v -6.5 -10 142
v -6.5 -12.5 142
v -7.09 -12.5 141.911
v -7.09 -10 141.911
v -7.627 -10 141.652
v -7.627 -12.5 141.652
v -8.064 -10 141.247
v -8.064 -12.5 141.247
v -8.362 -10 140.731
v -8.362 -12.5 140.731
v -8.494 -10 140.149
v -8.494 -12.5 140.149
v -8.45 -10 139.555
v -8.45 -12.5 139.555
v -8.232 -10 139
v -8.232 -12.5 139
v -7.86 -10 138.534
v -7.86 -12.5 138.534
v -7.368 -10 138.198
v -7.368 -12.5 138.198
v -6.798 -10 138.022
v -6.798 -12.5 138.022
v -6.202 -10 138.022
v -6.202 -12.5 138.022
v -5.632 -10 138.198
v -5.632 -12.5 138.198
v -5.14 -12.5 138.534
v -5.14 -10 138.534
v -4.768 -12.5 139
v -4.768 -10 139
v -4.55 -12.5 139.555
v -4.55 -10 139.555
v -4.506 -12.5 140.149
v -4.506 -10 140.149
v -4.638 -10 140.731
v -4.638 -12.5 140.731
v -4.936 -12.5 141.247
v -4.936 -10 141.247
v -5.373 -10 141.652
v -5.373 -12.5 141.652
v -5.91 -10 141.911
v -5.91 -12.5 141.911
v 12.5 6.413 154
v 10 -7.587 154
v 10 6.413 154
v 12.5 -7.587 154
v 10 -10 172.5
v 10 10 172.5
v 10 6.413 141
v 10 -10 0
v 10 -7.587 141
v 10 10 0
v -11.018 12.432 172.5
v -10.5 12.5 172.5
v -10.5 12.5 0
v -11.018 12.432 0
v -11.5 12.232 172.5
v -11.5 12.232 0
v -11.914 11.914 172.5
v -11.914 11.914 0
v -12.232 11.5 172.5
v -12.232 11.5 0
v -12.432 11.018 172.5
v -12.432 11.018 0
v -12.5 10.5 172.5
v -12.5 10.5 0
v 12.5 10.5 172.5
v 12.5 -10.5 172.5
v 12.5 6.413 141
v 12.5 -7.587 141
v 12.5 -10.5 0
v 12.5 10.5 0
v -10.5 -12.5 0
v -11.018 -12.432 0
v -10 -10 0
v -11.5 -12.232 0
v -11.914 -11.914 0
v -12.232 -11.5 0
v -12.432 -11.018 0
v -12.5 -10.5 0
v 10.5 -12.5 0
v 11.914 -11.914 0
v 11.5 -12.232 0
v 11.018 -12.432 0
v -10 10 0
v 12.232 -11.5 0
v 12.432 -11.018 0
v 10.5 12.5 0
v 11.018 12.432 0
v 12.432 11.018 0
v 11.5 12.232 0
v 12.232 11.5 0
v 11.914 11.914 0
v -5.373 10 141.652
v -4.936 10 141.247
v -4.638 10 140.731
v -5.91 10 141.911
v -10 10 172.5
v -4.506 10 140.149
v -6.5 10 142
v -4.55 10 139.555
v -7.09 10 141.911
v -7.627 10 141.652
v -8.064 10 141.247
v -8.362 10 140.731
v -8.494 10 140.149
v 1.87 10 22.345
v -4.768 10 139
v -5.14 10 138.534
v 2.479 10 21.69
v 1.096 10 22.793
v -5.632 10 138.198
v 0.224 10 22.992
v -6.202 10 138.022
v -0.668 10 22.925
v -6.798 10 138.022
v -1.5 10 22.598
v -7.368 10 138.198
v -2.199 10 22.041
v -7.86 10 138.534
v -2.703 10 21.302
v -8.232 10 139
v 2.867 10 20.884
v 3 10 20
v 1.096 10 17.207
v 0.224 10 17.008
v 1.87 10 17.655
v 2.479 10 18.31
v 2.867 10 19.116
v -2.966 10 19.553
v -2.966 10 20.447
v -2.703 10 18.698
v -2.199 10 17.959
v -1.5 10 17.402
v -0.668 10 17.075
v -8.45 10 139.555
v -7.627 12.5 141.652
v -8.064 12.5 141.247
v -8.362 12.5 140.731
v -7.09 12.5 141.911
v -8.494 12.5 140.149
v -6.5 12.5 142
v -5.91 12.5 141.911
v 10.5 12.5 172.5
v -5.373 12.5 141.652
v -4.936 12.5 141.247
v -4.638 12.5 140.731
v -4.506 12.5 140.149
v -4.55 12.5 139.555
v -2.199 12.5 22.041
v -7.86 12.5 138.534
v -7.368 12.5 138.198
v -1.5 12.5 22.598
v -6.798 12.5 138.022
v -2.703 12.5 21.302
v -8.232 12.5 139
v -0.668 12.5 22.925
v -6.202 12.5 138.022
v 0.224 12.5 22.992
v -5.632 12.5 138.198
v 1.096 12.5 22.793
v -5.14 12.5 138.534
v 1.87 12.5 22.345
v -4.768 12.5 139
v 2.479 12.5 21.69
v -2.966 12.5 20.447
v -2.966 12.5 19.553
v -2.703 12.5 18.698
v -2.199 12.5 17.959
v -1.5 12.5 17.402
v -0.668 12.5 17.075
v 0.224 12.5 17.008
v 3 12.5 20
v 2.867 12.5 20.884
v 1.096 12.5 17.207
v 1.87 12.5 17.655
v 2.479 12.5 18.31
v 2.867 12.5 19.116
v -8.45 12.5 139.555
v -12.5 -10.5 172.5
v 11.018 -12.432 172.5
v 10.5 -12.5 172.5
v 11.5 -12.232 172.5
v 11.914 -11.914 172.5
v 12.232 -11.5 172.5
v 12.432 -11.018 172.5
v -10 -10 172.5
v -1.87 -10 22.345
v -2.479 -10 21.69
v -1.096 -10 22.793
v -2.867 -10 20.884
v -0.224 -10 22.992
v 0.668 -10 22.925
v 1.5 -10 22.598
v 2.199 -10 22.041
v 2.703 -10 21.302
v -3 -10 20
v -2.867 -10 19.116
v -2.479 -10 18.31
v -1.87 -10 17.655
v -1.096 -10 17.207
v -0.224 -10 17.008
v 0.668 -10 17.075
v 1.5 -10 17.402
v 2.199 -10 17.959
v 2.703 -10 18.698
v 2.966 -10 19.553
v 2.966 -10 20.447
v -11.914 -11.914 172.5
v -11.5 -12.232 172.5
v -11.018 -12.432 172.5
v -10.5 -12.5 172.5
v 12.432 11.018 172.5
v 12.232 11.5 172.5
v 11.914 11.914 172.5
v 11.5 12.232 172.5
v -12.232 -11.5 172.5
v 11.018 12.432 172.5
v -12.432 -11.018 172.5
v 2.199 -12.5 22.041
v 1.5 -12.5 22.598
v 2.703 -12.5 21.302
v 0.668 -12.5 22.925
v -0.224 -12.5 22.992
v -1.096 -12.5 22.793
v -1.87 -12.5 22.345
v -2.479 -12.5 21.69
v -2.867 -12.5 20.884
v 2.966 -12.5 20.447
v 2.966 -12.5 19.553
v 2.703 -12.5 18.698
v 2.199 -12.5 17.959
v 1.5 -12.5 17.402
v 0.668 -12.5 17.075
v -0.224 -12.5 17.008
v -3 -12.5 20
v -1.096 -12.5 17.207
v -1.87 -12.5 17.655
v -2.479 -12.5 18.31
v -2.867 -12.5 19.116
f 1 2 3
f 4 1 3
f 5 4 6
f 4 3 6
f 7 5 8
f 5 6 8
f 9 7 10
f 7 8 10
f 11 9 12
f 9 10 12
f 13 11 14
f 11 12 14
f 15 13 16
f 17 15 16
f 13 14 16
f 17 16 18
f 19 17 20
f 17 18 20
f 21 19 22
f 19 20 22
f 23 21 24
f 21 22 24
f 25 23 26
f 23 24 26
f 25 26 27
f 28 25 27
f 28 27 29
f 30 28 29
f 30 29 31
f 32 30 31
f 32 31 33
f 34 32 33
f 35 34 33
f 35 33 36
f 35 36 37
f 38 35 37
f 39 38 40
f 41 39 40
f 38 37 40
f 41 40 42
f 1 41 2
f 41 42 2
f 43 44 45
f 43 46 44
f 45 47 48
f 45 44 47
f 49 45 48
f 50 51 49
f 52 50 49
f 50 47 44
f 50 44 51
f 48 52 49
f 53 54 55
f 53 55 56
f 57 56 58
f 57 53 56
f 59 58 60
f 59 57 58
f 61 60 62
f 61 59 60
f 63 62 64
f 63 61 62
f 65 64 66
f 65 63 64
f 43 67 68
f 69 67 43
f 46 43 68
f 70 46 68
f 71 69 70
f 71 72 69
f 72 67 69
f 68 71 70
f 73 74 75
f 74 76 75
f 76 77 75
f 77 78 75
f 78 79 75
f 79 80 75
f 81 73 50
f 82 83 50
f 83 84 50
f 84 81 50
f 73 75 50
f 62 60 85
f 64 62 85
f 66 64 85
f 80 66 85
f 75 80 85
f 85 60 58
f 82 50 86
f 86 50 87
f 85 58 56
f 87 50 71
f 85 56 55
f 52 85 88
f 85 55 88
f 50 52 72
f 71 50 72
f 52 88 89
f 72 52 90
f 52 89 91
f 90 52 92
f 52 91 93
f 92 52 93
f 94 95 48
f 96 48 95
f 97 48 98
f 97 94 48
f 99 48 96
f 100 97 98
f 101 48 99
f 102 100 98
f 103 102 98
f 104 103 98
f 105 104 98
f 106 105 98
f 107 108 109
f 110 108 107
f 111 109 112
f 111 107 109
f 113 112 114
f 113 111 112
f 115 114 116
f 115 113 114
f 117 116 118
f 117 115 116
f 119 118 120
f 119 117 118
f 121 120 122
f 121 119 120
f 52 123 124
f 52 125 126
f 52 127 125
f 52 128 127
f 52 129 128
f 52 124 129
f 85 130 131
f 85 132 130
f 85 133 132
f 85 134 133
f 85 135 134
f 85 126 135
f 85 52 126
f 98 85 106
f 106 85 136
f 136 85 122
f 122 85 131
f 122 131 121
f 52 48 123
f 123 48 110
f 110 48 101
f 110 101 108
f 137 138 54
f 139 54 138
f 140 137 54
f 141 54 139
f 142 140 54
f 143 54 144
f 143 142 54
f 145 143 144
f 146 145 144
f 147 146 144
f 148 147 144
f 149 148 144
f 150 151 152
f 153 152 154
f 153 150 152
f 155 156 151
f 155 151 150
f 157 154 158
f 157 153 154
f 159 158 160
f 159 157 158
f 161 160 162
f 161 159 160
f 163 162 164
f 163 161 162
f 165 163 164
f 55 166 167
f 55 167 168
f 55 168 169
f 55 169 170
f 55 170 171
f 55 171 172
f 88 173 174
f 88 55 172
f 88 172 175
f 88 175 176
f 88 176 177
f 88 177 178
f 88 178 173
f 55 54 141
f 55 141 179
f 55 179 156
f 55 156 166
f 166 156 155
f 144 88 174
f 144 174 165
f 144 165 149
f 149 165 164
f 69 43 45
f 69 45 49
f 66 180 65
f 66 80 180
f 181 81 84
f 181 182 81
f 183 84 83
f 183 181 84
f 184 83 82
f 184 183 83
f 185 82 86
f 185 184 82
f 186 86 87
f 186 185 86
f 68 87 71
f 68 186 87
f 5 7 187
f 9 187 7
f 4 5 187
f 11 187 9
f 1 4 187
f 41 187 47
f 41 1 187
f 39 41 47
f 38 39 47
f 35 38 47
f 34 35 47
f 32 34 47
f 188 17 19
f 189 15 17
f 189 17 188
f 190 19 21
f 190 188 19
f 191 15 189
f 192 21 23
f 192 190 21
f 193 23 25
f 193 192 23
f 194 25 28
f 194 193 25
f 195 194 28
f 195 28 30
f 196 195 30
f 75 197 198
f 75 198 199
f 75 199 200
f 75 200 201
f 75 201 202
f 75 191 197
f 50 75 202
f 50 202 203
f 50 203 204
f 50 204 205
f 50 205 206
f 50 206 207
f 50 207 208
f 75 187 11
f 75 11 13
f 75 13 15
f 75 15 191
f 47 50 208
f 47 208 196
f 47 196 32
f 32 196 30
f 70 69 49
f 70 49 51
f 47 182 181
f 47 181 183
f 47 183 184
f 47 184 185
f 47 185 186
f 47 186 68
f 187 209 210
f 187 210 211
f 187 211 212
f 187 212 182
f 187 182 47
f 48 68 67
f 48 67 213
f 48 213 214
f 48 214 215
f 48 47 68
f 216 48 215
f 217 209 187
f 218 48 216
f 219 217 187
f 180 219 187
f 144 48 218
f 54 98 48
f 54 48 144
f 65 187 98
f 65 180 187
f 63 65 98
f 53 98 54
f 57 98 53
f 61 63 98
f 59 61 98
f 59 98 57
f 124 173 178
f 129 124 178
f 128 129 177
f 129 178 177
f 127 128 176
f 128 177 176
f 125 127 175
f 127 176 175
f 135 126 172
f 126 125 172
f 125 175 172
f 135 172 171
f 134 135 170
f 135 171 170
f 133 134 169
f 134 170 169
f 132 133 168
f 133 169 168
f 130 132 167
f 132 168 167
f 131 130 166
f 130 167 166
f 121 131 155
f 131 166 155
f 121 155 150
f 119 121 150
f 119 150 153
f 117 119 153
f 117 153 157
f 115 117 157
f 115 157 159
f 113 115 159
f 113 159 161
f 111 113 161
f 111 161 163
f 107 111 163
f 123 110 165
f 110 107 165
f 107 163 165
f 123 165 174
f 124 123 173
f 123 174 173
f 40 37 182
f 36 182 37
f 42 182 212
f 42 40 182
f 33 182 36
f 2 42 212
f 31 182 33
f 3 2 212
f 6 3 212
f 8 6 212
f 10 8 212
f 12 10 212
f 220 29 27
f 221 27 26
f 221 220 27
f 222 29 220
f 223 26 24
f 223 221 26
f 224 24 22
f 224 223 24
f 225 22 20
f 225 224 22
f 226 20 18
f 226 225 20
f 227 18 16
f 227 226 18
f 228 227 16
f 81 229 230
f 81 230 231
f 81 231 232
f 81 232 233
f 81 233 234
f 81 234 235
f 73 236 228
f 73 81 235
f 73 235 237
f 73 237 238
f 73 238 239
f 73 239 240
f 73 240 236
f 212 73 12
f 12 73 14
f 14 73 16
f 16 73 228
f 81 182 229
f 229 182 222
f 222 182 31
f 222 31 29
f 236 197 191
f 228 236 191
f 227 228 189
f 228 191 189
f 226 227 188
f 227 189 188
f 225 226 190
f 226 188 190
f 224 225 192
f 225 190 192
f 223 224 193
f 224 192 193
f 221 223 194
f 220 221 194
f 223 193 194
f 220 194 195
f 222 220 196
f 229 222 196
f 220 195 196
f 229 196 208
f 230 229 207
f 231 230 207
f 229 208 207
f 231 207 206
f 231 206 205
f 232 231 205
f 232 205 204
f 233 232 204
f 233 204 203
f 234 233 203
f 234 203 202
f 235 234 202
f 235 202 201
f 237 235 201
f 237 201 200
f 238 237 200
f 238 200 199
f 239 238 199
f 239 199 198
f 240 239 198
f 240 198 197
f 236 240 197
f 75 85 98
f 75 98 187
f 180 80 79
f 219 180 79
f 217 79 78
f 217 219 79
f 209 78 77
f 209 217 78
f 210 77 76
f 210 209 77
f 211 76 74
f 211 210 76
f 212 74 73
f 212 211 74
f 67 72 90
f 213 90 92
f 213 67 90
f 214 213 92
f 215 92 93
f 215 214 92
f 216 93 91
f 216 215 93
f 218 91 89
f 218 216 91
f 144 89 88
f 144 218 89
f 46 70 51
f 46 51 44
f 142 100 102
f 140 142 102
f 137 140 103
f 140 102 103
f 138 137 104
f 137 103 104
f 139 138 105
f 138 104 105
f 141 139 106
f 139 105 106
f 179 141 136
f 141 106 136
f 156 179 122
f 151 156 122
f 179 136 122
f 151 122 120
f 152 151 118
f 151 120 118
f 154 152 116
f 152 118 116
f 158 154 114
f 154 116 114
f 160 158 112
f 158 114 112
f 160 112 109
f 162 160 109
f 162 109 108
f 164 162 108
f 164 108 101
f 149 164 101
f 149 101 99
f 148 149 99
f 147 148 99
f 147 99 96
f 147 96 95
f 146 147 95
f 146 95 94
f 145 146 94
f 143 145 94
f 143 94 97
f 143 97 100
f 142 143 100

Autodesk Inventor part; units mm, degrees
sketch "Sketch1" plane through (0, 0, 0) normal (0, 0, 1) x (1, 0, 0)
  line L0 (-12.5, 12.5) -> (12.5, 12.5)
  line L1 (12.5, 12.5) -> (12.5, -12.5)
  line L2 (12.5, -12.5) -> (-12.5, -12.5)
  line L3 (-12.5, -12.5) -> (-12.5, 12.5)
  line L4 (10, 10) -> (-10, 10)
  line L5 (-10, 10) -> (-10, -10)
  line L6 (-10, -10) -> (10, -10)
  line L7 (10, -10) -> (10, 10)
  point P0 (0, 0)
  dimension "d0" = 25
  dimension "d1" = 25
  dimension "d2" = 12.5
  dimension "d3" = 12.5
  dimension "d4" = 2.5
extrude "Extrusion1" add sketch "Sketch1" along normal blind 1000
fillet "Fillet1" radius 2 4 edges at (12.5, 12.5, 500) (-12.5, 12.5, 500) (-12.5, -12.5, 500) (12.5, -12.5, 500)
ref_plane "endPlane" through (0, 0, 172.5) normal (0, 0, -1) x (-1, 0, 0)
split "Split1" plane through (0, 0, 172.5) removes the side toward (0, 0, 1)
ref_plane "midPlane" through (-10.5, -12.5, 86.25) normal (0, 0, 1) x (1, 0, 0)
sketch "Sketch2" plane through (-10.5, 12.5, 0) normal (0, 1, 0) x (1, 0, 0)
  line L0 (10.5, -20) -> (10.5, -20) construction
  line L1 (13.5, -20) -> (13.5, -20)
  line L2 (7.5, -20) -> (7.5, -20)
  arc A0 (7.5, -20) -> (13.5, -20) centre (10.5, -20) ccw
  arc A1 (13.5, -20) -> (7.5, -20) centre (10.5, -20) ccw
  point P0 (10.5, 0)
  point P1 (10.5, -40)
  dimension "d46" = 6
  dimension "d47" = 0
  dimension "d48" = 20
  dimension "d49" = 0
sketch "Sketch3" plane through (12.5, -10.5, 0) normal (1, 0, 0) x (0, 0, -1)
  line L0 (-154, 16.9128) -> (-141, 16.9128)
  line L1 (-141, 16.9128) -> (-141, 2.9128)
  line L2 (-141, 2.9128) -> (-154, 2.9128)
  line L3 (-154, 2.9128) -> (-154, 16.9128)
  line L4 (-172.5, 21) -> (-172.5, 0) projected
  point P0 (0, 10.5)
  dimension "d28" = 14
  dimension "d29" = 18.5
  dimension "d30" = 13
extrude "Extrusion2" cut sketch "Sketch3" against normal up to surface (2.5 mm away)
sketch "Sketch4" plane through (-10.5, 12.5, 0) normal (0, 1, 0) x (1, 0, 0)
  line L0 (-2, 0) -> (-2, -1000) projected
  line L1 (0, -172.5) -> (21, -172.5) projected
  point P0 (10.5, 0)
  point P1 (-2, -172.5)
  point P2 (4, -140)
  point P3 (23, -141)
  dimension "d36" = 6
  dimension "d45" = 1
hole "Hole2" at (-6.5, 12.5, 140) direction (0, -1, 0) diameter 4 end through all
ref_plane "Work Plane3" through (12.5, -7.5872, 147.5) normal (0, 0, 1) x (1, 0, 0)
extrude "Extrusion3" cut sketch "Sketch2" against normal through all
equation "\"d0\" = -2 * a + sm_varx_squareBarDimension - tol"
equation "\"d1\" = d0"
equation "\"d2\" = 0.5 * d1"
equation "\"d3\" = 0.5 * d0"
equation "\"d4\" = sm_varx_squareBarThickness"
equation "\"d8\" = -sm_varx_z - 0.5 * d0"
equation "\"sm_varx_squareBarThickness\" = 2.5"
equation "\"sm_varx_pinPlate_holeDiameter\" = 5"
equation "\"sm_varx_member_tolerance\" = 0"
equation "\"a\" = sm_varx_squareBarThickness"
equation "\"hoop_angle_z\" = 45deg"
equation "\"hoop_bearing_length\" = 5deg"
equation "\"hoop_cable_diam\" = 5"
equation "\"hoop_cable_pulley_diam\" = 22"
equation "\"hoop_thickness_large\" = 4"
equation "\"hoop_thickness_medium\" = 3.2"
equation "\"hoop_thickness_small\" = 2"
equation "\"hoop_width_large\" = 51"
equation "\"hoop_width_medium\" = 33.7"
equation "\"hoop_width_small\" = 25.4"
equation "\"rack_tooth_addendum\" = 5"
equation "\"rack_tooth_dedendum\" = 5"
equation "\"rack_tooth_thickness\" = 5"
equation "\"secure_arm_angle\" = 35deg"
equation "\"secure_arm_radii\" = 9"
equation "\"support_baseClamp_platformLengthBuffer\" = 35"
equation "\"support_baseClamp_platformThickness\" = 15"
equation "\"support_baseClamp_platformWidthBuffer\" = 0"
equation "\"support_baseClamp_sleeveHoleDiameter\" = 12"
equation "\"support_baseClamp_sleeveSweepTerminationAngle\" = 55deg"
equation "\"support_baseClamp_thickness\" = 8"
equation "\"support_frame_endHoleBuffer\" = 45"
equation "\"support_frame_squareBarFillet\" = 2"
equation "\"support_frame_squareBarThickness\" = 5"
equation "\"hoop_tabs_thickness\" = 6"
equation "\"hoop_tabs_hole\" = 12"
equation "\"wheelchair_deployed_width\" = 635"
equation "\"wheelchair_deployed_length\" = 1067"
equation "\"wheelchair_deployed_height\" = 914"
equation "\"sm_varx_pinPlate_thickness\" = 5"
equation "\"hoop_bushing12_radialInterference\" = 0"
equation "\"hoop_bushing23_radialInterference\" = 0"
equation "\"hoop_bushing23_od\" = -2 * hoop_thickness_medium + hoop_width_medium + hoop_bushing23_radialInterference"
equation "\"hoop_bushing23_thickness\" = -hoop_width_small + hoop_bushing23_od - 2 * hoop_bushing23_radialInterference"
equation "\"hoop_bushing12_od\" = -2 * hoop_thickness_large + hoop_width_large + hoop_bushing12_radialInterference"
equation "\"wheelchatir_pos_deploy_angle_0\" = 65deg"
equation "\"wheelchatir_pos_store_angle_0\" = 90deg"
equation "\"wheelchatir_pos_deploy_angle_1\" = 20deg"
equation "\"wheelchatir_pos_store_angle_1\" = 20deg"
equation "\"hoop_bushing12_thickness\" = -hoop_width_medium + hoop_bushing12_od - 2 * hoop_bushing12_radialInterference"
equation "\"sm_varx_squareBarDimension\" = 30"
equation "\"tol\" = 0"
equation "\"sm_varx_z\" = 160"
properties part number "member_transverse_inner" material "Steel, Galvanized"
